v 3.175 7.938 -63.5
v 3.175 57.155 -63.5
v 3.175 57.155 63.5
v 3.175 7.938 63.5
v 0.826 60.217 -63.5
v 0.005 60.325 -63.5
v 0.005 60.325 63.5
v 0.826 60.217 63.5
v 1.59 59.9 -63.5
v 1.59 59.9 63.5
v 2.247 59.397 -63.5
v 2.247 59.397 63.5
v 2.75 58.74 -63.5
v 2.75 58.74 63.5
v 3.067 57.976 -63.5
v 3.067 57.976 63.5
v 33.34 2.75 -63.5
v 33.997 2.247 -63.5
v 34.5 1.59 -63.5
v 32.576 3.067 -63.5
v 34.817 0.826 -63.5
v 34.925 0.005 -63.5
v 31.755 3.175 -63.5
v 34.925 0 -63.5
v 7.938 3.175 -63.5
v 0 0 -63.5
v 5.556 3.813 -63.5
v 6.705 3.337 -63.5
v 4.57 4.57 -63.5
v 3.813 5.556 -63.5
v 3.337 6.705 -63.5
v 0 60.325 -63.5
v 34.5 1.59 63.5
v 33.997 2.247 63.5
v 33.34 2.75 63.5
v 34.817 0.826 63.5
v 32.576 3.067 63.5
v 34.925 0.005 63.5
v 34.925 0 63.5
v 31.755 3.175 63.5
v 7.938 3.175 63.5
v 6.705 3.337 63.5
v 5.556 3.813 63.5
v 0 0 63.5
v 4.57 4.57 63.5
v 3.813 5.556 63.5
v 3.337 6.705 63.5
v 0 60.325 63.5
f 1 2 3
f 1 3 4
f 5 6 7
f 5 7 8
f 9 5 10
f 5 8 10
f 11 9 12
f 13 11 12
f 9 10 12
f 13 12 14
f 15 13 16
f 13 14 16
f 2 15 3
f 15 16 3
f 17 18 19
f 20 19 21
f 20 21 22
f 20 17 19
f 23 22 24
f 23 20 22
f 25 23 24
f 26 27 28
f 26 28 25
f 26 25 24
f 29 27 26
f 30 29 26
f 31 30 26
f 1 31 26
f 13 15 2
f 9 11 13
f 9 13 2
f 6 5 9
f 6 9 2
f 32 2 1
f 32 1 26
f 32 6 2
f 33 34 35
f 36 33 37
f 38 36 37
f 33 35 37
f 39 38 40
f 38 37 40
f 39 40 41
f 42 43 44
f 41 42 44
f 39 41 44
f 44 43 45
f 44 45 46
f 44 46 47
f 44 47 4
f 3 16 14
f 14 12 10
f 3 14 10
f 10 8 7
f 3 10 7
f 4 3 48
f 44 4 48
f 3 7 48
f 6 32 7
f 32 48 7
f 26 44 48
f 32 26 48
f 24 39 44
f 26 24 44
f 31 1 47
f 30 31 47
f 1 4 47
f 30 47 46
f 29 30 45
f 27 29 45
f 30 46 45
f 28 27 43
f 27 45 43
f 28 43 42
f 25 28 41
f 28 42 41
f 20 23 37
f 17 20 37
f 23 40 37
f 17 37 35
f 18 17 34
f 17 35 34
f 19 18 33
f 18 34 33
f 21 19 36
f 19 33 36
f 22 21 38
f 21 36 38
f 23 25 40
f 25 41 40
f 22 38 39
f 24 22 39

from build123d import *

# Parameters (mm, degrees)
BASESTEELANGLE_DEPTH = 63.5


with BuildPart() as part:
    # Sketch1 → BaseSteelAngle (new body, symmetric)
    with BuildSketch(Plane.XY):
        with BuildLine():
            Line((0, 0), (0, 60.325))
            Line((0, 60.325), (0.00508, 60.325))
            ThreePointArc((0.00508, 60.325), (2.246551928, 59.396551928), (3.175, 57.15508))
            Line((3.175, 57.15508), (3.175, 7.9375))
            ThreePointArc((3.175, 7.9375), (4.569903955, 4.569903955), (7.9375, 3.175))
            Line((7.9375, 3.175), (31.75508, 3.175))
            ThreePointArc((31.75508, 3.175), (33.996551928, 2.246551928), (34.925, 0.00508))
            Line((34.925, 0.00508), (34.925, 0))
            Line((34.925, 0), (0, 0))
        make_face()
    extrude(amount=BASESTEELANGLE_DEPTH, both=True)


solid = part.part
